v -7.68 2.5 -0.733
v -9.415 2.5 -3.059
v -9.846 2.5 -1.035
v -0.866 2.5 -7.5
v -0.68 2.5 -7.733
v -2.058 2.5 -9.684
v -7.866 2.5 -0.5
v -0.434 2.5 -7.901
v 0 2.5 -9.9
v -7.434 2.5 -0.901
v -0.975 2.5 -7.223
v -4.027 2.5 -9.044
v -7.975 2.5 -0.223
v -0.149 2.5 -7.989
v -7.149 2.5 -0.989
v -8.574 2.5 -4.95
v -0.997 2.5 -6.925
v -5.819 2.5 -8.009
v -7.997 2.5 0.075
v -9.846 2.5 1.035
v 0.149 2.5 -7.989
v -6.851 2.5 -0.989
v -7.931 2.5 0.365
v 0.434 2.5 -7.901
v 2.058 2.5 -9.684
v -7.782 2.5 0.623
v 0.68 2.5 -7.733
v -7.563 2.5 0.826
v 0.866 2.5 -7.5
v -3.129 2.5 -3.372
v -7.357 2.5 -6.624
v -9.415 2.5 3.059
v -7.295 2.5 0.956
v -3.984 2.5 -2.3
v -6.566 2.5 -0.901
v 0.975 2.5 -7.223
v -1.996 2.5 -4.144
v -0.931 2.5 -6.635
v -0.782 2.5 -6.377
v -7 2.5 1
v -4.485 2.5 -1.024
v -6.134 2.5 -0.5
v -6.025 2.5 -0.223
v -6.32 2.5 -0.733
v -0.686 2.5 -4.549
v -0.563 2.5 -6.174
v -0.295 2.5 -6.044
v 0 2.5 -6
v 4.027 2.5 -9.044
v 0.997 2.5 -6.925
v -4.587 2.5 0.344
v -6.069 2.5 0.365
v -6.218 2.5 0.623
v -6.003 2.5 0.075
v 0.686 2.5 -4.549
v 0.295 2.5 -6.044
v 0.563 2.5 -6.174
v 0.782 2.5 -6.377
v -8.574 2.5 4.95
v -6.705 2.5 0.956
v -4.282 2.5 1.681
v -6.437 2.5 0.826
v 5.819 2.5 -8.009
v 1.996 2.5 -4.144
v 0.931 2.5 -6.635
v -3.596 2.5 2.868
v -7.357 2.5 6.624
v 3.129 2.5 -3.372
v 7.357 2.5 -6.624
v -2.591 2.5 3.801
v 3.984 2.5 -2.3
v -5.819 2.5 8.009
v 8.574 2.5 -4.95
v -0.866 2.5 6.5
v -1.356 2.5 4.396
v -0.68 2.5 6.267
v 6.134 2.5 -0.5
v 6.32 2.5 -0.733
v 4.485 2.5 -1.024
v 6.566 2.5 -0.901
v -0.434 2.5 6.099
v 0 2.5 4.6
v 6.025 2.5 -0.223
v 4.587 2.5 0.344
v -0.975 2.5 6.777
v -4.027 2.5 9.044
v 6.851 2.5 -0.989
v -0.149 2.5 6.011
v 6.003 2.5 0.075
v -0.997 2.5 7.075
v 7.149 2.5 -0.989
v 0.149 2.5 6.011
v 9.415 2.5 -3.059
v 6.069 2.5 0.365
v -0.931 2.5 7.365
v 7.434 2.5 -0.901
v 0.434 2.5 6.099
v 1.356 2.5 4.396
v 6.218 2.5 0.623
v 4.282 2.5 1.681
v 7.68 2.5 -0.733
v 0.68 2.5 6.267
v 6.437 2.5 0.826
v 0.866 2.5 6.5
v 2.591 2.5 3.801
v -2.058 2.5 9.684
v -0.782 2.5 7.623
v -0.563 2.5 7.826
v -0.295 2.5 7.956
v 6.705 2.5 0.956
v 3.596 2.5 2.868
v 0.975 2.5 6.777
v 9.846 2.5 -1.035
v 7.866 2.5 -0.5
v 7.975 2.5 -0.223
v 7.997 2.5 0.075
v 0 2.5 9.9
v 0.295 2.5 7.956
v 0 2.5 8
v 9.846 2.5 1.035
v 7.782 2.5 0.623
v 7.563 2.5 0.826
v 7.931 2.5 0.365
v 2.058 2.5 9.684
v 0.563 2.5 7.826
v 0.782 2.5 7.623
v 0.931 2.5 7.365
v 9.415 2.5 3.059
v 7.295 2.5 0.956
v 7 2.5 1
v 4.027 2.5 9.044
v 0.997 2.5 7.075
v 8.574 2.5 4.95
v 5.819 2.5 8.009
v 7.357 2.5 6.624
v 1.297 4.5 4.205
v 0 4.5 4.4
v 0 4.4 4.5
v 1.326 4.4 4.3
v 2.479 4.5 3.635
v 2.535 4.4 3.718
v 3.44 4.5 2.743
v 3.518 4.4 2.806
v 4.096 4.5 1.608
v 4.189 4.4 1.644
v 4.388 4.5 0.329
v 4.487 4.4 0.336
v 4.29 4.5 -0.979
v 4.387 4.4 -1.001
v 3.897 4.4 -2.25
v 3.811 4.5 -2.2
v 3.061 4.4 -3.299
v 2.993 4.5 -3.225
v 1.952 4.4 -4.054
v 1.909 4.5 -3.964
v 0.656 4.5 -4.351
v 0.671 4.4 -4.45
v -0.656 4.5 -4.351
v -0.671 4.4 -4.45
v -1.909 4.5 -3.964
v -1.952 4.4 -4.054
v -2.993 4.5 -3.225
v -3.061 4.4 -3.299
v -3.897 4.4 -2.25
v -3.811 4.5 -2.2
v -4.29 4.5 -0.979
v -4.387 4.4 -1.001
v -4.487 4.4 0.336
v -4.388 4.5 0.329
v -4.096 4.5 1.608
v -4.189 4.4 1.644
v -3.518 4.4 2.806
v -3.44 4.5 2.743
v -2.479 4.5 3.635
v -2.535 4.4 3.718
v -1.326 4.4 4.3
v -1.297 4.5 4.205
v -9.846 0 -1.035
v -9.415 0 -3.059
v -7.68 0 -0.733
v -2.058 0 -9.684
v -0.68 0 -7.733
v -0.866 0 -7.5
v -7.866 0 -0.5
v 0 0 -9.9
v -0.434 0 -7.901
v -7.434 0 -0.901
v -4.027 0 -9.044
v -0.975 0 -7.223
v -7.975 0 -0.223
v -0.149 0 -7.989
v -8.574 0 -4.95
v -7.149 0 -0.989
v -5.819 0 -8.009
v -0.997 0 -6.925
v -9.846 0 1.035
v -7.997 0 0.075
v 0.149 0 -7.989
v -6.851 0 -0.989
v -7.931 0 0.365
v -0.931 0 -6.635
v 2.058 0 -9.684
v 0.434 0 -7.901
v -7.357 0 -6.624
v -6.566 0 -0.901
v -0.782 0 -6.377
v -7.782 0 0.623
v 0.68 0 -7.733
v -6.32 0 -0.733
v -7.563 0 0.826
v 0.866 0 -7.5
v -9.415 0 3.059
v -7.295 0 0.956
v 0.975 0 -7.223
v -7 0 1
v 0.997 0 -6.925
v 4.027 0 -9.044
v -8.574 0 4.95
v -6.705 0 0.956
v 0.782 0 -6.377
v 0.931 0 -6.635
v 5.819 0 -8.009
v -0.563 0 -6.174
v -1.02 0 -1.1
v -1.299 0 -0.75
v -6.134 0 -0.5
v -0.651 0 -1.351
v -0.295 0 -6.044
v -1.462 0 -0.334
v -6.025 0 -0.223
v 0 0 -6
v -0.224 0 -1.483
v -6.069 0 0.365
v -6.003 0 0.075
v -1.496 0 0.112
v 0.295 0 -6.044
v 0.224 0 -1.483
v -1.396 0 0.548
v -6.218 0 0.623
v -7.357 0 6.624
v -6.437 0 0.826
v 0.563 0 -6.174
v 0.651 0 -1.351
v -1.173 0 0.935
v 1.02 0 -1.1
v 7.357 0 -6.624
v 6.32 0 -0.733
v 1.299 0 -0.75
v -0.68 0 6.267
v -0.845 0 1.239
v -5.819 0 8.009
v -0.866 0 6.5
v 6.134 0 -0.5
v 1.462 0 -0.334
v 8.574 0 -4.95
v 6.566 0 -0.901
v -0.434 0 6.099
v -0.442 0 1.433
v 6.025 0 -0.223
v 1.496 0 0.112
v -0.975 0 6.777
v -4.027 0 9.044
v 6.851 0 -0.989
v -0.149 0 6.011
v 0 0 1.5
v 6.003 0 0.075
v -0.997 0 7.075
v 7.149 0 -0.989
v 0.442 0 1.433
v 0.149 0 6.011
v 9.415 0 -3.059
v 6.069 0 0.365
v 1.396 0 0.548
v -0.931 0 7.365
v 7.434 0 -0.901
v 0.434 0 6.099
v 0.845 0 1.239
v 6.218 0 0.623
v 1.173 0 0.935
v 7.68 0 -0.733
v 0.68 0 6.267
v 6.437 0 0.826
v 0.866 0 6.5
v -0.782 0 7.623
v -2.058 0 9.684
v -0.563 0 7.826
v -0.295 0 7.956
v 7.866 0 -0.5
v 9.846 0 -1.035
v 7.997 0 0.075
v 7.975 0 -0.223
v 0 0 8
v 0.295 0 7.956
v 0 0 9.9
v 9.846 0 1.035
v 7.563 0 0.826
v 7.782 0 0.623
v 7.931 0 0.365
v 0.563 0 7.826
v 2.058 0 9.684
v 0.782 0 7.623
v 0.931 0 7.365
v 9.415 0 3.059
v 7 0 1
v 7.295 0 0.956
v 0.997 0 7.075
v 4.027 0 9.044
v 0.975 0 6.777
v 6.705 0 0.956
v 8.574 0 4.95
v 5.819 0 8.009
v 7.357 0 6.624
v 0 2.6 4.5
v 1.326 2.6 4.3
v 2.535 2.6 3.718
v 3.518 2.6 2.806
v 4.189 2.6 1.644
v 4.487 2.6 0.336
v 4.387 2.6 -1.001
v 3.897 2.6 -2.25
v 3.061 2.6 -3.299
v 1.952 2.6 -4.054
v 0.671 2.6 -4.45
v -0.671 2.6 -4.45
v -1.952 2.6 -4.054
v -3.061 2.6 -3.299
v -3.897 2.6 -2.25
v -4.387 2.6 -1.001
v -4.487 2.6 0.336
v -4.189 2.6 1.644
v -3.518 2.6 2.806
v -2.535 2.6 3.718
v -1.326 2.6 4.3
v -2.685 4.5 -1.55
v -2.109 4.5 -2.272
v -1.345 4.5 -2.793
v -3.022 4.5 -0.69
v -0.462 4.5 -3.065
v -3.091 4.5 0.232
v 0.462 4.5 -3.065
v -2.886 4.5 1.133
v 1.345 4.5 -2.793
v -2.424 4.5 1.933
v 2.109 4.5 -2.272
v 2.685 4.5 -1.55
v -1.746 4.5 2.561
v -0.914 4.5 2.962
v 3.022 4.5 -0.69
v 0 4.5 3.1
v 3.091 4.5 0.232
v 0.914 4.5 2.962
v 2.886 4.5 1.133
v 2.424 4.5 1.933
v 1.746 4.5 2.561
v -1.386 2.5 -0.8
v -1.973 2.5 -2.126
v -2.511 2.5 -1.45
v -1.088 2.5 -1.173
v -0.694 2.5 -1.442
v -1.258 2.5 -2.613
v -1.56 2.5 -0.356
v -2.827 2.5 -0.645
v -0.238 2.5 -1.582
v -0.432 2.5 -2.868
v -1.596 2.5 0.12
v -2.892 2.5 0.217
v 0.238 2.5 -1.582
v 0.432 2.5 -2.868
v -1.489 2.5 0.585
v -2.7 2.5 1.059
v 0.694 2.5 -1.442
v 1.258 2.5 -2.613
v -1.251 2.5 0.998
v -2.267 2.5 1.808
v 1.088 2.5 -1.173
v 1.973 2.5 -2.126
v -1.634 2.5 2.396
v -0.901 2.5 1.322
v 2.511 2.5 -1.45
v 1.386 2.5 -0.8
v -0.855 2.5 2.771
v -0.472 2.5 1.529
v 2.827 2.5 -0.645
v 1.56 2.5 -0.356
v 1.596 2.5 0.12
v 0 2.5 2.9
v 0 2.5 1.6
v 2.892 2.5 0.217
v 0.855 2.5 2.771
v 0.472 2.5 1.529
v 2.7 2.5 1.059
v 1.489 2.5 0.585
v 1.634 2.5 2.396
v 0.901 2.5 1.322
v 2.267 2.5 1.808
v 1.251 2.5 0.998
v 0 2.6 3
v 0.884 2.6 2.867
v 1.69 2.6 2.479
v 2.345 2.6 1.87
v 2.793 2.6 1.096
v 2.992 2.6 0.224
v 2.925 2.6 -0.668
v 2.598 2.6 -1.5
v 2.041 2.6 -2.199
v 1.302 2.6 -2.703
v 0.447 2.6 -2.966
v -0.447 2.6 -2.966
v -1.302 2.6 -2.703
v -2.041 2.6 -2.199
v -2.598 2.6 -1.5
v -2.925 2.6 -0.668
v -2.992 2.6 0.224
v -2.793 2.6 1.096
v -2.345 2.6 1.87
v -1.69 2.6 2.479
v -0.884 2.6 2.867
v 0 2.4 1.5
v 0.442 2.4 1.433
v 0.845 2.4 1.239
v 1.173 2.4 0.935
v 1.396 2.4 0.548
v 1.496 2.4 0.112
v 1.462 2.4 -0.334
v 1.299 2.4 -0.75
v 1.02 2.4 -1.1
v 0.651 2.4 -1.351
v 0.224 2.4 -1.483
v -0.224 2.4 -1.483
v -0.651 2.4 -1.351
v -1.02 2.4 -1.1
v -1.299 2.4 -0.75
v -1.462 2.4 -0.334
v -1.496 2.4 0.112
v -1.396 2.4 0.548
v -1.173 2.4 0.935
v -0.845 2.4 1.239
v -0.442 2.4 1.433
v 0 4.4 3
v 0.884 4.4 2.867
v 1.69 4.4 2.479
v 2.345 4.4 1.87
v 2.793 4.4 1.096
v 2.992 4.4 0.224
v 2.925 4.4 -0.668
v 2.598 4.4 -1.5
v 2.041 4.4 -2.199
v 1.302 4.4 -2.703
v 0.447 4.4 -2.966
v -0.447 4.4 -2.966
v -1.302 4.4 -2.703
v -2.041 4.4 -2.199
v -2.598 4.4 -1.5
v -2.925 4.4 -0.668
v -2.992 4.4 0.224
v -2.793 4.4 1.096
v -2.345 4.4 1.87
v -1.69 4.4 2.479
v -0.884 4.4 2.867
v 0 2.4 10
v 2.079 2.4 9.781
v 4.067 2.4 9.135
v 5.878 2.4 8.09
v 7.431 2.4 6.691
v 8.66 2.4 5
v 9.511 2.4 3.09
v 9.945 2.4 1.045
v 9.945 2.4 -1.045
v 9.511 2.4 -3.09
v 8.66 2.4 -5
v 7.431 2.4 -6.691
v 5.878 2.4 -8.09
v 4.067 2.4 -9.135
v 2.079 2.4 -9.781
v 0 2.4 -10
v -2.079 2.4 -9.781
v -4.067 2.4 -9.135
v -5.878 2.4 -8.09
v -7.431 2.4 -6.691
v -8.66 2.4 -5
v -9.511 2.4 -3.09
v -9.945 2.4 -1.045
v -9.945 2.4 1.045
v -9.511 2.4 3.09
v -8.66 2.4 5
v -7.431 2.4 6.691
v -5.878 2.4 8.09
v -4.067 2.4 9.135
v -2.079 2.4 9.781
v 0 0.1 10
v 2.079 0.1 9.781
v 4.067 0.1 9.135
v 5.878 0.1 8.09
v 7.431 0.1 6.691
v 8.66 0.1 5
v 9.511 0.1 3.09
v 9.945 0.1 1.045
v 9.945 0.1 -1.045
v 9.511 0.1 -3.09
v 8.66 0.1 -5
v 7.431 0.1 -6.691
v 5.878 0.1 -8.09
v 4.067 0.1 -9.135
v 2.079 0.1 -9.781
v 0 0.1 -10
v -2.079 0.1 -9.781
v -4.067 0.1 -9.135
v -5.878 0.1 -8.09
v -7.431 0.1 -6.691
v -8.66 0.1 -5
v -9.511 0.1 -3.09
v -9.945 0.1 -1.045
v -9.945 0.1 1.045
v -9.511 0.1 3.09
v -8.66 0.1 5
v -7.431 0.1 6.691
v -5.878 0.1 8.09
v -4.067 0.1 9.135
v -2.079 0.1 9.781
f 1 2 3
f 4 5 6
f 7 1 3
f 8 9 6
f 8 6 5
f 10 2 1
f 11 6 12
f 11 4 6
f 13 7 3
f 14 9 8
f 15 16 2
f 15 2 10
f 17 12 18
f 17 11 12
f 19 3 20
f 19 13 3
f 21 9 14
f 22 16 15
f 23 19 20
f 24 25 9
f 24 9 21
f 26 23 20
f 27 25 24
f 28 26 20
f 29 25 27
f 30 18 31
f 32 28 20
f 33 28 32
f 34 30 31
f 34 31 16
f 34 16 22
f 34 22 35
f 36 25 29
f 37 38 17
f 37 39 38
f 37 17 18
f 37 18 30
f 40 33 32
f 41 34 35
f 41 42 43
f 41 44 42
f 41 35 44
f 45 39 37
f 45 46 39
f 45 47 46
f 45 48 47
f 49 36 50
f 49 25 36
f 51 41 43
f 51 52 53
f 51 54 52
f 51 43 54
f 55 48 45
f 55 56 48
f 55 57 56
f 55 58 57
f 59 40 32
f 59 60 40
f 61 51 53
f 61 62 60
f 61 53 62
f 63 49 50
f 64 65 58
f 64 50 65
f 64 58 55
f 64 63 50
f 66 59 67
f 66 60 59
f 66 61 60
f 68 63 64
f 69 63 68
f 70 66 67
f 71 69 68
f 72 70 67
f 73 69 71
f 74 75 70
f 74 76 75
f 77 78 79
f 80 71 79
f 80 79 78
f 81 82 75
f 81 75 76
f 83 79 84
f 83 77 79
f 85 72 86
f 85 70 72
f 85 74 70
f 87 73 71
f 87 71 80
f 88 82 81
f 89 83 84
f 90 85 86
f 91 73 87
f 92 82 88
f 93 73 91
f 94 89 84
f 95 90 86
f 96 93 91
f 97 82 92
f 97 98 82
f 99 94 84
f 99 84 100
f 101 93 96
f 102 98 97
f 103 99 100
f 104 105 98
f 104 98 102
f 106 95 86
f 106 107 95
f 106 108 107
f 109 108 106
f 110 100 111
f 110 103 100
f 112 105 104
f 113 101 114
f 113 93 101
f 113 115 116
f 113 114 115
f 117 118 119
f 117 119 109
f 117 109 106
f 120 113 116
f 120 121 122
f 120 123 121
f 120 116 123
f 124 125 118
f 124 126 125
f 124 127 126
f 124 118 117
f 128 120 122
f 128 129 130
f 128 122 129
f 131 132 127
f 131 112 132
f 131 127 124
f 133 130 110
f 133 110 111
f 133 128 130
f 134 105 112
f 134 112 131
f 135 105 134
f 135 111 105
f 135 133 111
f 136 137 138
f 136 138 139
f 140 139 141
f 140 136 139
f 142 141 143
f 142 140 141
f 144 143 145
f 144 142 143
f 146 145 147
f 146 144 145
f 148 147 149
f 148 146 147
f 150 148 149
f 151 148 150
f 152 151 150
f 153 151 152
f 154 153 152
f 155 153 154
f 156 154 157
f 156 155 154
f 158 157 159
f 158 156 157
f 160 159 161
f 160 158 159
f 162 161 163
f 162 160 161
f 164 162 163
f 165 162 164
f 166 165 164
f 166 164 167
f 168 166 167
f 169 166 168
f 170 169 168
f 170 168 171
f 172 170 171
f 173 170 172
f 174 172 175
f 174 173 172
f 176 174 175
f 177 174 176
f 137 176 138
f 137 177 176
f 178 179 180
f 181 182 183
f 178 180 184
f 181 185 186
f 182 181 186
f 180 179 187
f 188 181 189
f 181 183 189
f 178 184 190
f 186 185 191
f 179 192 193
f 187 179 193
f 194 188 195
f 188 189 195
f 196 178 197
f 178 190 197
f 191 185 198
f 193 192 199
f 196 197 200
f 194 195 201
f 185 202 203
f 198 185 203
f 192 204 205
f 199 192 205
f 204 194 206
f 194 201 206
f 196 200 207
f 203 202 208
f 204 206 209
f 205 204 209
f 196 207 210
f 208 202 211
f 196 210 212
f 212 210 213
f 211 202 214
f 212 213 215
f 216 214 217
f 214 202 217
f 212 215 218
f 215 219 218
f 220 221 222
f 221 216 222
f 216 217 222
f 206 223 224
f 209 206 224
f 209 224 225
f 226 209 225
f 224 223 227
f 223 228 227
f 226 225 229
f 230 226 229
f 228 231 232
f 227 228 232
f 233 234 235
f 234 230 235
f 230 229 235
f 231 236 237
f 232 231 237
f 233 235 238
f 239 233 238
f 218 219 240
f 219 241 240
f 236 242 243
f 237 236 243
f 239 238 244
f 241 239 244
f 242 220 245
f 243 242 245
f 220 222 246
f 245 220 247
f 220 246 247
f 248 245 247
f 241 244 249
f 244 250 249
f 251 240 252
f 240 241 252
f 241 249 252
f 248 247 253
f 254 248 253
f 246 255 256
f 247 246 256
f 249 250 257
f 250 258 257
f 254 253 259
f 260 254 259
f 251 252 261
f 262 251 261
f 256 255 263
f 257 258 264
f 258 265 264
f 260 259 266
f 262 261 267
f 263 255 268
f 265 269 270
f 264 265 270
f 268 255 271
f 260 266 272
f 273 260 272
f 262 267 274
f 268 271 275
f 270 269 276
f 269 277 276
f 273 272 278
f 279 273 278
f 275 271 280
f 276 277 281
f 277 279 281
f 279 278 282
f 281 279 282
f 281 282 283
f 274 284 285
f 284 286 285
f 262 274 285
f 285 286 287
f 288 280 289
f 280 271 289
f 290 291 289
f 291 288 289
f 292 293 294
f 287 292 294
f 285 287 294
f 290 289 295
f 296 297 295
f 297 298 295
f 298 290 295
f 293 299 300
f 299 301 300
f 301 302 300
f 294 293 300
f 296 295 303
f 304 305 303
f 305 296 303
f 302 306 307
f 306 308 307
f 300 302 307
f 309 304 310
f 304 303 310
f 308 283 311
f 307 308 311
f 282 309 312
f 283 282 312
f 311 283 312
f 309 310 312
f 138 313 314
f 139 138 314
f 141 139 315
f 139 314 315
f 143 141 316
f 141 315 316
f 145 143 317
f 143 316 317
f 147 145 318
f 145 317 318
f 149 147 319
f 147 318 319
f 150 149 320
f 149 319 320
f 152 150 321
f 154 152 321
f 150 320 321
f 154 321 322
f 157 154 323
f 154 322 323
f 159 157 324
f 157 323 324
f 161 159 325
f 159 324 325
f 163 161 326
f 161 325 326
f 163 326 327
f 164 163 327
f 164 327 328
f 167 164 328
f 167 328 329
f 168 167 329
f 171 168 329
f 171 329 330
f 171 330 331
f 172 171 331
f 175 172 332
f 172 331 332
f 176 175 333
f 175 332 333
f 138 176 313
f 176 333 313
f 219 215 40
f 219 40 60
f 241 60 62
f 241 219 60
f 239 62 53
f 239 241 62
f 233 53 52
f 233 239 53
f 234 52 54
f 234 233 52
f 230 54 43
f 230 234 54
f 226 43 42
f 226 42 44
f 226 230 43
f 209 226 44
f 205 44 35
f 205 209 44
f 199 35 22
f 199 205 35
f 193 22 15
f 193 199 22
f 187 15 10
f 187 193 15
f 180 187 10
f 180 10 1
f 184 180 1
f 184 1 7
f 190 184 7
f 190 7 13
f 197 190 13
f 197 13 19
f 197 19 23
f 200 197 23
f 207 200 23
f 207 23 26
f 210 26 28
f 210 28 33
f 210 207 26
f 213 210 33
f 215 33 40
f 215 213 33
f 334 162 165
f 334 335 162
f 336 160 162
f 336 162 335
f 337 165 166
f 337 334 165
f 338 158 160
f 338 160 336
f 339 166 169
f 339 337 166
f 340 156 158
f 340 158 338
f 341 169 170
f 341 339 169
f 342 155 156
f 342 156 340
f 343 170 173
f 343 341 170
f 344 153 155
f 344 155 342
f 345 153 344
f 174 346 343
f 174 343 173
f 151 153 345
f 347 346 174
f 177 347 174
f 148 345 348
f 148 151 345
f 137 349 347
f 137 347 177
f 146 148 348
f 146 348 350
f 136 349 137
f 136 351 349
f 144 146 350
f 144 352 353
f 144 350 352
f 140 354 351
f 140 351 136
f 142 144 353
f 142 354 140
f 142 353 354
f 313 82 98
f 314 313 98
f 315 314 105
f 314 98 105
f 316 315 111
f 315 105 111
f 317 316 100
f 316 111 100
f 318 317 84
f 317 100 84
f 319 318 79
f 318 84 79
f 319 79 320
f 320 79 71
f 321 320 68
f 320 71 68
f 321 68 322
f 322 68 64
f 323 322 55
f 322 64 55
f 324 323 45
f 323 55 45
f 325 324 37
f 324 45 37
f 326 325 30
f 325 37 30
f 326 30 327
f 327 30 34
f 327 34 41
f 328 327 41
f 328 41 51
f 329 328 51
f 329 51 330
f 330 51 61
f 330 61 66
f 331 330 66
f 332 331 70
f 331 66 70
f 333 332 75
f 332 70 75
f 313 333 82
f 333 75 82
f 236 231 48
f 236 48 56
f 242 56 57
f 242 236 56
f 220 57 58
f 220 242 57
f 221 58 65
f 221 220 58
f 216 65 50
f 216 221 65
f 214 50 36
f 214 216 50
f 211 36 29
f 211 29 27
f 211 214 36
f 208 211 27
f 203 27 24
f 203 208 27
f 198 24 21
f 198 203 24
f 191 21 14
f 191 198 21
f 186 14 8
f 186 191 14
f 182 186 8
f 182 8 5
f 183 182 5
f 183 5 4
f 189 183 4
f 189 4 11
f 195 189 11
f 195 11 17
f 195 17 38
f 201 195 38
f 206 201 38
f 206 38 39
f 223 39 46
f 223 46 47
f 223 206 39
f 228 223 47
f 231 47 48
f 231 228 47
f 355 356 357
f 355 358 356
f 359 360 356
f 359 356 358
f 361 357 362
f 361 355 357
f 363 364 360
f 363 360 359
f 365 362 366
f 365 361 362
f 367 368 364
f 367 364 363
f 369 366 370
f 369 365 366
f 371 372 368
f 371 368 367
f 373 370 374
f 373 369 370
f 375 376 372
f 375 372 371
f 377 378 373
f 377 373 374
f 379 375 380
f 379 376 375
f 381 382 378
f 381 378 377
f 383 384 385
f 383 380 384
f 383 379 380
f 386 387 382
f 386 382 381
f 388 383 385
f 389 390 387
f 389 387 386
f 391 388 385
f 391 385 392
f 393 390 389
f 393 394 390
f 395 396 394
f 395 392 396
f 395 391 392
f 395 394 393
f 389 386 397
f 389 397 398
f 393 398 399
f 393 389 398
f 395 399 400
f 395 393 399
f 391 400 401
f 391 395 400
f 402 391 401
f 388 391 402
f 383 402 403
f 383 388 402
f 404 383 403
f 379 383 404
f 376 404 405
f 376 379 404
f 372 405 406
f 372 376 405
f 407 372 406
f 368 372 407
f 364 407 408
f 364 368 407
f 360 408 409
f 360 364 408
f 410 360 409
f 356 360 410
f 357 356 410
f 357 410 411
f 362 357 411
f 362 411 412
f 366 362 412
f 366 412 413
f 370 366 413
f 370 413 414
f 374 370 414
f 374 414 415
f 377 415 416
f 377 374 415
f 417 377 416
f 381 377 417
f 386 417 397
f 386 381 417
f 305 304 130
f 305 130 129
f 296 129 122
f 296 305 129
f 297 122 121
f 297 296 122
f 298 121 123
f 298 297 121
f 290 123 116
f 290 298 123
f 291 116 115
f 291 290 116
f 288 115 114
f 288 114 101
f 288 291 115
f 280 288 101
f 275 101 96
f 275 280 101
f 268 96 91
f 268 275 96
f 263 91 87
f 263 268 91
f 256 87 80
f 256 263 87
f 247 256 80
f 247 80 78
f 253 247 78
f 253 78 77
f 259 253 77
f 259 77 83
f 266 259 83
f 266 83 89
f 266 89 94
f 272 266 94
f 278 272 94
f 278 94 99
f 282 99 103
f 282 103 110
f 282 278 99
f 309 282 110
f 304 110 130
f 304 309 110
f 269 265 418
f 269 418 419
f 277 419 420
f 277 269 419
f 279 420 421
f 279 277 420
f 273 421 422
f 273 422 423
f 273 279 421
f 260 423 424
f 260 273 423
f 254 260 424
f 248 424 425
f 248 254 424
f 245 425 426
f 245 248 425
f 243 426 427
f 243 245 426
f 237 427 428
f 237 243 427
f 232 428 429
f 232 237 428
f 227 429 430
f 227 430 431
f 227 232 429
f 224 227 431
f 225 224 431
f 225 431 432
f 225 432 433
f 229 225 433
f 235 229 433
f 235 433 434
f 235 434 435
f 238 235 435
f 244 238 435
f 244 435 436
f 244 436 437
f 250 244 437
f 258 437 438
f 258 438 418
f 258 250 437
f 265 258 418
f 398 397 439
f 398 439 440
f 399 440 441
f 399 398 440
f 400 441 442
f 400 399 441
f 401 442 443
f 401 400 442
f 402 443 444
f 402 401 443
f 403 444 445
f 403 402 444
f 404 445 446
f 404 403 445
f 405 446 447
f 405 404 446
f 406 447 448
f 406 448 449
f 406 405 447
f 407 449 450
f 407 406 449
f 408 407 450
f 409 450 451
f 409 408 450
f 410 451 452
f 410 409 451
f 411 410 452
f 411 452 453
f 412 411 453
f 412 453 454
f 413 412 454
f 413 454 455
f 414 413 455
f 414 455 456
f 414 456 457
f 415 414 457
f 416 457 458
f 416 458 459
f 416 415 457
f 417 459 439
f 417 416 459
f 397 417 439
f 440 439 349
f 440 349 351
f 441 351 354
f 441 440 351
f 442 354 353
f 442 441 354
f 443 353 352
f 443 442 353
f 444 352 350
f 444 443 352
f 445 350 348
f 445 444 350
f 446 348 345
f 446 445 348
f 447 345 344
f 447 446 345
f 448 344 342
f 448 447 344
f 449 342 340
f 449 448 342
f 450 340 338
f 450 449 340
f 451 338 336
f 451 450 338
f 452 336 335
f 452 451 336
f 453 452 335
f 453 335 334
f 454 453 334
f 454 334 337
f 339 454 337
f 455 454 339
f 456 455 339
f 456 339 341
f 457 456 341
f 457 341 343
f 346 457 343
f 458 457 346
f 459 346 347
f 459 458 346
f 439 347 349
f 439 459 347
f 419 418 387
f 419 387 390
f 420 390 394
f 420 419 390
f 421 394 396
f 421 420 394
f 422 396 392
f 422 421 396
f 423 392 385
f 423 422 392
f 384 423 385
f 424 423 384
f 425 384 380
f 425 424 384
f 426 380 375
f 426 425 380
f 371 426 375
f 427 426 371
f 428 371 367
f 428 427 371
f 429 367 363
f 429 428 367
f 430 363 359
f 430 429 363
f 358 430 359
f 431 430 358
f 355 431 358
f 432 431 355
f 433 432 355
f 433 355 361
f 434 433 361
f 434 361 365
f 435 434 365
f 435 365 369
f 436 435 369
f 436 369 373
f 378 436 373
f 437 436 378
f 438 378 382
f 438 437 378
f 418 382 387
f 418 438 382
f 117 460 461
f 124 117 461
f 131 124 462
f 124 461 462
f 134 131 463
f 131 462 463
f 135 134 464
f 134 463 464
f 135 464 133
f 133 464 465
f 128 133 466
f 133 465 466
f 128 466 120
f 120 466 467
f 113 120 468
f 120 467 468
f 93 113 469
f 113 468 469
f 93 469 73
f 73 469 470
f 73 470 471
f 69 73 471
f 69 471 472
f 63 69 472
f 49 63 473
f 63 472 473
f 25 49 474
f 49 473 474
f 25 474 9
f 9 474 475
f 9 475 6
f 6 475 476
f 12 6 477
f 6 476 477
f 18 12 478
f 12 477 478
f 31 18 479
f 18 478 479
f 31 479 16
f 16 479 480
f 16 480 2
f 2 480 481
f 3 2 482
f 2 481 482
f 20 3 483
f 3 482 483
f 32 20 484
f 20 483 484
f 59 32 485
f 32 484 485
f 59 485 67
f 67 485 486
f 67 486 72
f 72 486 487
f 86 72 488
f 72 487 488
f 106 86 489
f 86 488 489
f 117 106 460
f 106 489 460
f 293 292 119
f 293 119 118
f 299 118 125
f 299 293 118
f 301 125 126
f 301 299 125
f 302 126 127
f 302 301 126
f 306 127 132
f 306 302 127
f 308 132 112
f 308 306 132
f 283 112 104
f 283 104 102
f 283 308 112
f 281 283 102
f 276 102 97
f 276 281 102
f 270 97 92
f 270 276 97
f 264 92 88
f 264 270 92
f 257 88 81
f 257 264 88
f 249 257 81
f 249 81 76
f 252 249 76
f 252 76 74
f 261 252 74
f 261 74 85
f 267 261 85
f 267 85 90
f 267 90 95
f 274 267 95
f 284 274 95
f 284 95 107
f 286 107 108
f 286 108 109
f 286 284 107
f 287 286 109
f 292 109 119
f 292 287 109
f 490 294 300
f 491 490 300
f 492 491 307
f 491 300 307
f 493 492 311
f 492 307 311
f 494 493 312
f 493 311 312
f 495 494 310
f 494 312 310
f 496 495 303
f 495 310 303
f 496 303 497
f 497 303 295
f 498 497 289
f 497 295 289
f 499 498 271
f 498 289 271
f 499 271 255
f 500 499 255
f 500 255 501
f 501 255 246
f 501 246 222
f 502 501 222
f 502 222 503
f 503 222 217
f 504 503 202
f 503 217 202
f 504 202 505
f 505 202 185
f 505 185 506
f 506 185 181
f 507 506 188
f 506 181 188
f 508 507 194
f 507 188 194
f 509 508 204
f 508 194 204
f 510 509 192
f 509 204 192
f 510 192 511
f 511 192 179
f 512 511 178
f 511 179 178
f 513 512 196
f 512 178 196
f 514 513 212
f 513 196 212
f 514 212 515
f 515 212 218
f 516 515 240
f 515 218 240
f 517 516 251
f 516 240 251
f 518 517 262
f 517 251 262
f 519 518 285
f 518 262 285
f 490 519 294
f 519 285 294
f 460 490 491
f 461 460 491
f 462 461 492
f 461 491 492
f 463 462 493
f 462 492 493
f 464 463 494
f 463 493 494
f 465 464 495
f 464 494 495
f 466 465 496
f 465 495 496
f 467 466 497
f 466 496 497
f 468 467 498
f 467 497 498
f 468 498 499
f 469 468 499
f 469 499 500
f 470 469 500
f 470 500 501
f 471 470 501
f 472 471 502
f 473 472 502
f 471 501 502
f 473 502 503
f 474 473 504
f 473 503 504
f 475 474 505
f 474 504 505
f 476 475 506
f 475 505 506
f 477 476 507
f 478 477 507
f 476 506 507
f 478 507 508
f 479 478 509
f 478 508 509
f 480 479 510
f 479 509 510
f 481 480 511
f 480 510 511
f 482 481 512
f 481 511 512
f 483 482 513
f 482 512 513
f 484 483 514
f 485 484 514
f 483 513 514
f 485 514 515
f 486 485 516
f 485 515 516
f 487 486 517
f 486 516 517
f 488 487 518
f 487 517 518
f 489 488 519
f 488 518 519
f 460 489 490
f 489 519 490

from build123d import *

# Parameters (mm, degrees)
SKETCH_1_R      = 10
SKETCH_1_R_2    = 1.5
SKETCH_1_R_3    = 1
EXTRUDE_1_DEPTH = 2.5
SKETCH_2_R      = 4.5
SKETCH_2_R_2    = 3
EXTRUDE_2_DEPTH = 2
CHAMFER_1_SIZE  = 0.1
CHAMFER_2_SIZE  = 0.1


with BuildPart() as part:
    # 草图1 → 凸台-拉伸1 (new body)
    with BuildSketch(Plane(origin=(0, 0, 0), x_dir=(1, 0, 0), z_dir=(0, 1, 0))):
        with Locations(Location((0, 0, 0), (0, 0, 270))):
            Circle(SKETCH_1_R)
        with Locations(Location((0, 0, 0), (0, 0, 270))):
            Circle(SKETCH_1_R_2, mode=Mode.SUBTRACT)
        with Locations(Location((0, 7, 0), (0, 0, 270))):
            Circle(SKETCH_1_R_3, mode=Mode.SUBTRACT)
        with Locations(Location((7, 0, 0), (0, 0, 270))):
            Circle(SKETCH_1_R_3, mode=Mode.SUBTRACT)
        with Locations(Location((0, -7, 0), (0, 0, 270))):
            Circle(SKETCH_1_R_3, mode=Mode.SUBTRACT)
        with Locations(Location((-7, 0, 0), (0, 0, 270))):
            Circle(SKETCH_1_R_3, mode=Mode.SUBTRACT)
    extrude(amount=EXTRUDE_1_DEPTH)

    # 草图2 → 凸台-拉伸2 (add)
    with BuildSketch(Plane(origin=(0, 2.5, 0), x_dir=(1, 0, 0), z_dir=(0, 1, 0))):
        with Locations(Location((0, 0, 0), (0, 0, 270))):
            Circle(SKETCH_2_R)
        with Locations(Location((0, 0, 0), (0, 0, 270))):
            Circle(SKETCH_2_R_2, mode=Mode.SUBTRACT)
    extrude(amount=EXTRUDE_2_DEPTH)

    # 倒角1
    chamfer_1_edges = [part.edges().sort_by_distance(p)[0] for p in [
        (0, 4.5, -4.5),
    ]]
    chamfer(chamfer_1_edges, length=CHAMFER_1_SIZE)

    # 倒角2
    chamfer_2_edges = [part.edges().sort_by_distance(p)[0] for p in [
        (0, 0, -10),
        (0, 2.5, -4.5),
        (0, 2.5, -3),
        (0, 4.5, -3),
        (0, 2.5, -10),
        (0, 2.5, -1.5),
    ]]
    chamfer(chamfer_2_edges, length=CHAMFER_2_SIZE)


solid = part.part
